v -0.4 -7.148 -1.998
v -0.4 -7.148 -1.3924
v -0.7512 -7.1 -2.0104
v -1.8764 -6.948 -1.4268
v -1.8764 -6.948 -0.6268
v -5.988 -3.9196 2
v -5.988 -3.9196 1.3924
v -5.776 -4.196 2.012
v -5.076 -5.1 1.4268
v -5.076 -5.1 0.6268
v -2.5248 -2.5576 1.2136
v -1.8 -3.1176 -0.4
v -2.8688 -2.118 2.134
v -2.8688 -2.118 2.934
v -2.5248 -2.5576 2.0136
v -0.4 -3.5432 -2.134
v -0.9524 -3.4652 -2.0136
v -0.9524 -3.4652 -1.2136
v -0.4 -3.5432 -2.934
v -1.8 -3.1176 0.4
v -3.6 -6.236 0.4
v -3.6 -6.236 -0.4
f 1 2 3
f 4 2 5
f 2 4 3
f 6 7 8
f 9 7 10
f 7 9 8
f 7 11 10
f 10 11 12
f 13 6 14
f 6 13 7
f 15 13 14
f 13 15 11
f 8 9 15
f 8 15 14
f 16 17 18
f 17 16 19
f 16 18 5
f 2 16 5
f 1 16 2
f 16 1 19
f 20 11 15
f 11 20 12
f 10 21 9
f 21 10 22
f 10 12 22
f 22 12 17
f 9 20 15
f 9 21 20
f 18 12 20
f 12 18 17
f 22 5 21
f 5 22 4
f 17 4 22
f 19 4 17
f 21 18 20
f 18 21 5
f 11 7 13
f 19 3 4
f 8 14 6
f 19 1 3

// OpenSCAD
use <../../lib.scad>
function ldraw_lib__s__32177s01() = [
// 0 ~Technic Beam  7 x  1 Liftarm with Ribs and Fan - Fan Blade
// 0 Name: s\32177s01.dat
// 0 Author: Marc Klein [marckl]
// 0 !LDRAW_ORG Subpart UPDATE 2010-01
// 0 !LICENSE Licensed under CC BY 2.0 and CC BY 4.0 : see CAreadme.txt
// 
// 0 BFC CERTIFY CCW
  [0,"BFC","CERTIFY"],
  [0,"BFC","CCW"],
// 
// 0 !HISTORY 2004-07-07 [guyvivan] Add missing optionals lines
// 0 !HISTORY 2010-04-05 [PTadmin] Official Update 2010-01
// 
// 
// 3 16 -1 4.995 -17.87 -1 3.481 -17.87 -1.878 5.026 -17.75
  [3,16,-1,4.995,-17.87,-1,3.481,-17.87,-1.878,5.026,-17.75],
// 2 24 -1 4.995 -17.87 -1 3.481 -17.87
  [2,24,-1,4.995,-17.87,-1,3.481,-17.87],
// 2 24 -1.878 5.026 -17.75 -1 4.995 -17.87
  [2,24,-1.878,5.026,-17.75,-1,4.995,-17.87],
// 4 16 -1.878 5.026 -17.75 -1 3.481 -17.87 -4.691 1.567 -17.37 -4.691 3.567 -17.37
  [4,16,-1.878,5.026,-17.75,-1,3.481,-17.87,-4.691,1.567,-17.37,-4.691,3.567,-17.37],
// 2 24 -1 3.481 -17.87 -4.691 1.567 -17.37
  [2,24,-1,3.481,-17.87,-4.691,1.567,-17.37],
// 5 24 -4.691 1.567 -17.37 -4.691 3.567 -17.37 -1.878 5.026 -17.75 -9 -1 -15.59
  [5,24,-4.691,1.567,-17.37,-4.691,3.567,-17.37,-1.878,5.026,-17.75,-9,-1,-15.59],
// 2 24 -4.691 3.567 -17.37 -1.878 5.026 -17.75
  [2,24,-4.691,3.567,-17.37,-1.878,5.026,-17.75],
// 3 16 -14.97 -5 -9.799 -14.97 -3.481 -9.799 -14.44 -5.03 -10.49
  [3,16,-14.97,-5,-9.799,-14.97,-3.481,-9.799,-14.44,-5.03,-10.49],
// 2 24 -14.97 -3.481 -9.799 -14.97 -5 -9.799
  [2,24,-14.97,-3.481,-9.799,-14.97,-5,-9.799],
// 2 24 -14.44 -5.03 -10.49 -14.97 -5 -9.799
  [2,24,-14.44,-5.03,-10.49,-14.97,-5,-9.799],
// 4 16 -14.44 -5.03 -10.49 -14.97 -3.481 -9.799 -12.69 -1.567 -12.75 -12.69 -3.567 -12.75
  [4,16,-14.44,-5.03,-10.49,-14.97,-3.481,-9.799,-12.69,-1.567,-12.75,-12.69,-3.567,-12.75],
// 2 24 -12.69 -1.567 -12.75 -14.97 -3.481 -9.799
  [2,24,-12.69,-1.567,-12.75,-14.97,-3.481,-9.799],
// 5 24 -12.69 -1.567 -12.75 -12.69 -3.567 -12.75 -14.44 -5.03 -10.49 -9 1 -15.59
  [5,24,-12.69,-1.567,-12.75,-12.69,-3.567,-12.75,-14.44,-5.03,-10.49,-9,1,-15.59],
// 2 24 -12.69 -3.567 -12.75 -14.44 -5.03 -10.49
  [2,24,-12.69,-3.567,-12.75,-14.44,-5.03,-10.49],
// 3 16 -14.97 -3.481 -9.799 -6.312 -3.034 -6.394 -12.69 -1.567 -12.75
  [3,16,-14.97,-3.481,-9.799,-6.312,-3.034,-6.394,-12.69,-1.567,-12.75],
// 5 24 -6.312 -3.034 -6.394 -12.69 -1.567 -12.75 -14.97 -3.481 -9.799 -4.5 1 -7.794
  [5,24,-6.312,-3.034,-6.394,-12.69,-1.567,-12.75,-14.97,-3.481,-9.799,-4.5,1,-7.794],
// 3 16 -12.69 -1.567 -12.75 -6.312 -3.034 -6.394 -4.5 1 -7.794
  [3,16,-12.69,-1.567,-12.75,-6.312,-3.034,-6.394,-4.5,1,-7.794],
// 5 24 -14.97 -3.481 -9.799 -6.312 -3.034 -6.394 -12.69 -1.567 -12.75 -7.172 -5.335 -5.295
  [5,24,-14.97,-3.481,-9.799,-6.312,-3.034,-6.394,-12.69,-1.567,-12.75,-7.172,-5.335,-5.295],
// 4 16 -7.172 -7.335 -5.295 -7.172 -5.335 -5.295 -14.97 -3.481 -9.799 -14.97 -5 -9.799
  [4,16,-7.172,-7.335,-5.295,-7.172,-5.335,-5.295,-14.97,-3.481,-9.799,-14.97,-5,-9.799],
// 2 24 -7.172 -7.335 -5.295 -7.172 -5.335 -5.295
  [2,24,-7.172,-7.335,-5.295,-7.172,-5.335,-5.295],
// 5 24 -7.172 -5.335 -5.295 -14.97 -3.481 -9.799 -14.97 -5 -9.799 -6.312 -3.034 -6.394
  [5,24,-7.172,-5.335,-5.295,-14.97,-3.481,-9.799,-14.97,-5,-9.799,-6.312,-3.034,-6.394],
// 2 24 -14.97 -5 -9.799 -7.172 -7.335 -5.295
  [2,24,-14.97,-5,-9.799,-7.172,-7.335,-5.295],
// 4 16 -7.172 -7.335 -5.295 -6.312 -5.034 -6.394 -6.312 -3.034 -6.394 -7.172 -5.335 -5.295
  [4,16,-7.172,-7.335,-5.295,-6.312,-5.034,-6.394,-6.312,-3.034,-6.394,-7.172,-5.335,-5.295],
// 2 24 -7.172 -7.335 -5.295 -6.312 -5.034 -6.394
  [2,24,-7.172,-7.335,-5.295,-6.312,-5.034,-6.394],
// 2 24 -6.312 -3.034 -6.394 -7.172 -5.335 -5.295
  [2,24,-6.312,-3.034,-6.394,-7.172,-5.335,-5.295],
// 3 16 -14.44 -5.03 -10.49 -12.69 -3.567 -12.75 -6.312 -5.034 -6.394
  [3,16,-14.44,-5.03,-10.49,-12.69,-3.567,-12.75,-6.312,-5.034,-6.394],
// 5 24 -14.44 -5.03 -10.49 -6.312 -5.034 -6.394 -12.69 -3.567 -12.75 -7.172 -7.335 -5.295
  [5,24,-14.44,-5.03,-10.49,-6.312,-5.034,-6.394,-12.69,-3.567,-12.75,-7.172,-7.335,-5.295],
// 3 16 -14.44 -5.03 -10.49 -6.312 -5.034 -6.394 -7.172 -7.335 -5.295
  [3,16,-14.44,-5.03,-10.49,-6.312,-5.034,-6.394,-7.172,-7.335,-5.295],
// 5 24 -12.69 -3.567 -12.75 -6.312 -5.034 -6.394 -14.44 -5.03 -10.49 -4.5 -1 -7.794
  [5,24,-12.69,-3.567,-12.75,-6.312,-5.034,-6.394,-14.44,-5.03,-10.49,-4.5,-1,-7.794],
// 4 16 -2.381 3.034 -8.663 -1 5.335 -8.858 -1 7.335 -8.858 -2.381 5.034 -8.663
  [4,16,-2.381,3.034,-8.663,-1,5.335,-8.858,-1,7.335,-8.858,-2.381,5.034,-8.663],
// 2 24 -2.381 3.034 -8.663 -1 5.335 -8.858
  [2,24,-2.381,3.034,-8.663,-1,5.335,-8.858],
// 2 24 -1 5.335 -8.858 -1 7.335 -8.858
  [2,24,-1,5.335,-8.858,-1,7.335,-8.858],
// 2 24 -1 7.335 -8.858 -2.381 5.034 -8.663
  [2,24,-1,7.335,-8.858,-2.381,5.034,-8.663],
// 5 24 -1 7.335 -8.858 -4.691 3.567 -17.37 -2.381 5.034 -8.663 -1.878 5.026 -17.75
  [5,24,-1,7.335,-8.858,-4.691,3.567,-17.37,-2.381,5.034,-8.663,-1.878,5.026,-17.75],
// 3 16 -1 5.335 -8.858 -2.381 3.034 -8.663 -4.691 1.567 -17.37
  [3,16,-1,5.335,-8.858,-2.381,3.034,-8.663,-4.691,1.567,-17.37],
// 5 24 -1 5.335 -8.858 -4.691 1.567 -17.37 -2.381 3.034 -8.663 -1 3.481 -17.87
  [5,24,-1,5.335,-8.858,-4.691,1.567,-17.37,-2.381,3.034,-8.663,-1,3.481,-17.87],
// 3 16 -1 3.481 -17.87 -1 5.335 -8.858 -4.691 1.567 -17.37
  [3,16,-1,3.481,-17.87,-1,5.335,-8.858,-4.691,1.567,-17.37],
// 5 24 -1 5.335 -8.858 -1 3.481 -17.87 -4.691 1.567 -17.37 -1 7.335 -8.858
  [5,24,-1,5.335,-8.858,-1,3.481,-17.87,-4.691,1.567,-17.37,-1,7.335,-8.858],
// 4 16 -1 7.335 -8.858 -1 5.335 -8.858 -1 3.481 -17.87 -1 4.995 -17.87
  [4,16,-1,7.335,-8.858,-1,5.335,-8.858,-1,3.481,-17.87,-1,4.995,-17.87],
// 5 24 -2.381 3.034 -8.663 -4.691 1.567 -17.37 -1 5.335 -8.858 -9 -1 -15.59
  [5,24,-2.381,3.034,-8.663,-4.691,1.567,-17.37,-1,5.335,-8.858,-9,-1,-15.59],
// 4 16 -6.312 -5.034 -6.394 -4.5 -1 -7.794 -4.5 1 -7.794 -6.312 -3.034 -6.394
  [4,16,-6.312,-5.034,-6.394,-4.5,-1,-7.794,-4.5,1,-7.794,-6.312,-3.034,-6.394],
// 2 24 -6.312 -5.034 -6.394 -4.5 -1 -7.794
  [2,24,-6.312,-5.034,-6.394,-4.5,-1,-7.794],
// 2 24 -4.5 1 -7.794 -6.312 -3.034 -6.394
  [2,24,-4.5,1,-7.794,-6.312,-3.034,-6.394],
// 5 24 -4.5 1 -7.794 -12.69 -1.567 -12.75 -6.312 -3.034 -6.394 -9 1 -15.59
  [5,24,-4.5,1,-7.794,-12.69,-1.567,-12.75,-6.312,-3.034,-6.394,-9,1,-15.59],
// 4 16 -9 1 -15.59 -9 -1 -15.59 -12.69 -3.567 -12.75 -12.69 -1.567 -12.75
  [4,16,-9,1,-15.59,-9,-1,-15.59,-12.69,-3.567,-12.75,-12.69,-1.567,-12.75],
// 5 24 -9 1 -15.59 -9 -1 -15.59 -12.69 -3.567 -12.75 -4.691 3.567 -17.37
  [5,24,-9,1,-15.59,-9,-1,-15.59,-12.69,-3.567,-12.75,-4.691,3.567,-17.37],
// 2 24 -9 -1 -15.59 -12.69 -3.567 -12.75
  [2,24,-9,-1,-15.59,-12.69,-3.567,-12.75],
// 2 24 -12.69 -1.567 -12.75 -9 1 -15.59
  [2,24,-12.69,-1.567,-12.75,-9,1,-15.59],
// 3 16 -12.69 -1.567 -12.75 -4.5 1 -7.794 -9 1 -15.59
  [3,16,-12.69,-1.567,-12.75,-4.5,1,-7.794,-9,1,-15.59],
// 5 24 -4.5 1 -7.794 -9 1 -15.59 -12.69 -1.567 -12.75 -2.381 5.034 -8.663
  [5,24,-4.5,1,-7.794,-9,1,-15.59,-12.69,-1.567,-12.75,-2.381,5.034,-8.663],
// 3 16 -9 1 -15.59 -4.5 1 -7.794 -2.381 5.034 -8.663
  [3,16,-9,1,-15.59,-4.5,1,-7.794,-2.381,5.034,-8.663],
// 3 16 -12.69 -3.567 -12.75 -4.5 -1 -7.794 -6.312 -5.034 -6.394
  [3,16,-12.69,-3.567,-12.75,-4.5,-1,-7.794,-6.312,-5.034,-6.394],
// 5 24 -12.69 -3.567 -12.75 -4.5 -1 -7.794 -6.312 -5.034 -6.394 -9 -1 -15.59
  [5,24,-12.69,-3.567,-12.75,-4.5,-1,-7.794,-6.312,-5.034,-6.394,-9,-1,-15.59],
// 3 16 -12.69 -3.567 -12.75 -9 -1 -15.59 -4.5 -1 -7.794
  [3,16,-12.69,-3.567,-12.75,-9,-1,-15.59,-4.5,-1,-7.794],
// 4 16 -2.381 5.034 -8.663 -4.5 1 -7.794 -4.5 -1 -7.794 -2.381 3.034 -8.663
  [4,16,-2.381,5.034,-8.663,-4.5,1,-7.794,-4.5,-1,-7.794,-2.381,3.034,-8.663],
// 2 24 -2.381 5.034 -8.663 -4.5 1 -7.794
  [2,24,-2.381,5.034,-8.663,-4.5,1,-7.794],
// 2 24 -4.5 -1 -7.794 -2.381 3.034 -8.663
  [2,24,-4.5,-1,-7.794,-2.381,3.034,-8.663],
// 5 24 -2.381 5.034 -8.663 -9 1 -15.59 -4.5 1 -7.794 -4.691 3.567 -17.37
  [5,24,-2.381,5.034,-8.663,-9,1,-15.59,-4.5,1,-7.794,-4.691,3.567,-17.37],
// 4 16 -9 -1 -15.59 -9 1 -15.59 -4.691 3.567 -17.37 -4.691 1.567 -17.37
  [4,16,-9,-1,-15.59,-9,1,-15.59,-4.691,3.567,-17.37,-4.691,1.567,-17.37],
// 2 24 -9 1 -15.59 -4.691 3.567 -17.37
  [2,24,-9,1,-15.59,-4.691,3.567,-17.37],
// 2 24 -4.691 1.567 -17.37 -9 -1 -15.59
  [2,24,-4.691,1.567,-17.37,-9,-1,-15.59],
// 3 16 -2.381 5.034 -8.663 -4.691 3.567 -17.37 -9 1 -15.59
  [3,16,-2.381,5.034,-8.663,-4.691,3.567,-17.37,-9,1,-15.59],
// 5 24 -2.381 5.034 -8.663 -4.691 3.567 -17.37 -9 1 -15.59 -1 7.335 -8.858
  [5,24,-2.381,5.034,-8.663,-4.691,3.567,-17.37,-9,1,-15.59,-1,7.335,-8.858],
// 3 16 -1 7.335 -8.858 -4.691 3.567 -17.37 -2.381 5.034 -8.663
  [3,16,-1,7.335,-8.858,-4.691,3.567,-17.37,-2.381,5.034,-8.663],
// 5 24 -9 -1 -15.59 -4.5 -1 -7.794 -12.69 -3.567 -12.75 -2.381 3.034 -8.663
  [5,24,-9,-1,-15.59,-4.5,-1,-7.794,-12.69,-3.567,-12.75,-2.381,3.034,-8.663],
// 3 16 -9 -1 -15.59 -2.381 3.034 -8.663 -4.5 -1 -7.794
  [3,16,-9,-1,-15.59,-2.381,3.034,-8.663,-4.5,-1,-7.794],
// 5 24 -9 -1 -15.59 -2.381 3.034 -8.663 -4.5 -1 -7.794 -4.691 1.567 -17.37
  [5,24,-9,-1,-15.59,-2.381,3.034,-8.663,-4.5,-1,-7.794,-4.691,1.567,-17.37],
// 3 16 -2.381 3.034 -8.663 -9 -1 -15.59 -4.691 1.567 -17.37
  [3,16,-2.381,3.034,-8.663,-9,-1,-15.59,-4.691,1.567,-17.37],
// 2 24 -1 4.995 -17.87 -1 7.335 -8.858
  [2,24,-1,4.995,-17.87,-1,7.335,-8.858],
// 3 16 -6.312 -3.034 -6.394 -14.97 -3.481 -9.799 -7.172 -5.335 -5.295
  [3,16,-6.312,-3.034,-6.394,-14.97,-3.481,-9.799,-7.172,-5.335,-5.295],
// 3 16 -1 7.335 -8.858 -1.878 5.026 -17.75 -4.691 3.567 -17.37
  [3,16,-1,7.335,-8.858,-1.878,5.026,-17.75,-4.691,3.567,-17.37],
// 5 24 -1 7.335 -8.858 -1.878 5.026 -17.75 -4.691 3.567 -17.37 -1 4.995 -17.87
  [5,24,-1,7.335,-8.858,-1.878,5.026,-17.75,-4.691,3.567,-17.37,-1,4.995,-17.87],
// 3 16 -14.44 -5.03 -10.49 -7.172 -7.335 -5.295 -14.97 -5 -9.799
  [3,16,-14.44,-5.03,-10.49,-7.172,-7.335,-5.295,-14.97,-5,-9.799],
// 5 24 -14.44 -5.03 -10.49 -7.172 -7.335 -5.295 -14.97 -5 -9.799 -6.312 -5.034 -6.394
  [5,24,-14.44,-5.03,-10.49,-7.172,-7.335,-5.295,-14.97,-5,-9.799,-6.312,-5.034,-6.394],
// 3 16 -1 7.335 -8.858 -1 4.995 -17.87 -1.878 5.026 -17.75
  [3,16,-1,7.335,-8.858,-1,4.995,-17.87,-1.878,5.026,-17.75],
// 0
];
module ldraw_lib__s__32177s01(step=0, col=false, unit=2/5, alt=false, line=0.2, solid=!$preview)
    makepoly(ldraw_lib__s__32177s01(), step=step, col=col, unit=unit, alt=alt, line=line, solid=solid);
ldraw_lib__s__32177s01(line=0.2);
